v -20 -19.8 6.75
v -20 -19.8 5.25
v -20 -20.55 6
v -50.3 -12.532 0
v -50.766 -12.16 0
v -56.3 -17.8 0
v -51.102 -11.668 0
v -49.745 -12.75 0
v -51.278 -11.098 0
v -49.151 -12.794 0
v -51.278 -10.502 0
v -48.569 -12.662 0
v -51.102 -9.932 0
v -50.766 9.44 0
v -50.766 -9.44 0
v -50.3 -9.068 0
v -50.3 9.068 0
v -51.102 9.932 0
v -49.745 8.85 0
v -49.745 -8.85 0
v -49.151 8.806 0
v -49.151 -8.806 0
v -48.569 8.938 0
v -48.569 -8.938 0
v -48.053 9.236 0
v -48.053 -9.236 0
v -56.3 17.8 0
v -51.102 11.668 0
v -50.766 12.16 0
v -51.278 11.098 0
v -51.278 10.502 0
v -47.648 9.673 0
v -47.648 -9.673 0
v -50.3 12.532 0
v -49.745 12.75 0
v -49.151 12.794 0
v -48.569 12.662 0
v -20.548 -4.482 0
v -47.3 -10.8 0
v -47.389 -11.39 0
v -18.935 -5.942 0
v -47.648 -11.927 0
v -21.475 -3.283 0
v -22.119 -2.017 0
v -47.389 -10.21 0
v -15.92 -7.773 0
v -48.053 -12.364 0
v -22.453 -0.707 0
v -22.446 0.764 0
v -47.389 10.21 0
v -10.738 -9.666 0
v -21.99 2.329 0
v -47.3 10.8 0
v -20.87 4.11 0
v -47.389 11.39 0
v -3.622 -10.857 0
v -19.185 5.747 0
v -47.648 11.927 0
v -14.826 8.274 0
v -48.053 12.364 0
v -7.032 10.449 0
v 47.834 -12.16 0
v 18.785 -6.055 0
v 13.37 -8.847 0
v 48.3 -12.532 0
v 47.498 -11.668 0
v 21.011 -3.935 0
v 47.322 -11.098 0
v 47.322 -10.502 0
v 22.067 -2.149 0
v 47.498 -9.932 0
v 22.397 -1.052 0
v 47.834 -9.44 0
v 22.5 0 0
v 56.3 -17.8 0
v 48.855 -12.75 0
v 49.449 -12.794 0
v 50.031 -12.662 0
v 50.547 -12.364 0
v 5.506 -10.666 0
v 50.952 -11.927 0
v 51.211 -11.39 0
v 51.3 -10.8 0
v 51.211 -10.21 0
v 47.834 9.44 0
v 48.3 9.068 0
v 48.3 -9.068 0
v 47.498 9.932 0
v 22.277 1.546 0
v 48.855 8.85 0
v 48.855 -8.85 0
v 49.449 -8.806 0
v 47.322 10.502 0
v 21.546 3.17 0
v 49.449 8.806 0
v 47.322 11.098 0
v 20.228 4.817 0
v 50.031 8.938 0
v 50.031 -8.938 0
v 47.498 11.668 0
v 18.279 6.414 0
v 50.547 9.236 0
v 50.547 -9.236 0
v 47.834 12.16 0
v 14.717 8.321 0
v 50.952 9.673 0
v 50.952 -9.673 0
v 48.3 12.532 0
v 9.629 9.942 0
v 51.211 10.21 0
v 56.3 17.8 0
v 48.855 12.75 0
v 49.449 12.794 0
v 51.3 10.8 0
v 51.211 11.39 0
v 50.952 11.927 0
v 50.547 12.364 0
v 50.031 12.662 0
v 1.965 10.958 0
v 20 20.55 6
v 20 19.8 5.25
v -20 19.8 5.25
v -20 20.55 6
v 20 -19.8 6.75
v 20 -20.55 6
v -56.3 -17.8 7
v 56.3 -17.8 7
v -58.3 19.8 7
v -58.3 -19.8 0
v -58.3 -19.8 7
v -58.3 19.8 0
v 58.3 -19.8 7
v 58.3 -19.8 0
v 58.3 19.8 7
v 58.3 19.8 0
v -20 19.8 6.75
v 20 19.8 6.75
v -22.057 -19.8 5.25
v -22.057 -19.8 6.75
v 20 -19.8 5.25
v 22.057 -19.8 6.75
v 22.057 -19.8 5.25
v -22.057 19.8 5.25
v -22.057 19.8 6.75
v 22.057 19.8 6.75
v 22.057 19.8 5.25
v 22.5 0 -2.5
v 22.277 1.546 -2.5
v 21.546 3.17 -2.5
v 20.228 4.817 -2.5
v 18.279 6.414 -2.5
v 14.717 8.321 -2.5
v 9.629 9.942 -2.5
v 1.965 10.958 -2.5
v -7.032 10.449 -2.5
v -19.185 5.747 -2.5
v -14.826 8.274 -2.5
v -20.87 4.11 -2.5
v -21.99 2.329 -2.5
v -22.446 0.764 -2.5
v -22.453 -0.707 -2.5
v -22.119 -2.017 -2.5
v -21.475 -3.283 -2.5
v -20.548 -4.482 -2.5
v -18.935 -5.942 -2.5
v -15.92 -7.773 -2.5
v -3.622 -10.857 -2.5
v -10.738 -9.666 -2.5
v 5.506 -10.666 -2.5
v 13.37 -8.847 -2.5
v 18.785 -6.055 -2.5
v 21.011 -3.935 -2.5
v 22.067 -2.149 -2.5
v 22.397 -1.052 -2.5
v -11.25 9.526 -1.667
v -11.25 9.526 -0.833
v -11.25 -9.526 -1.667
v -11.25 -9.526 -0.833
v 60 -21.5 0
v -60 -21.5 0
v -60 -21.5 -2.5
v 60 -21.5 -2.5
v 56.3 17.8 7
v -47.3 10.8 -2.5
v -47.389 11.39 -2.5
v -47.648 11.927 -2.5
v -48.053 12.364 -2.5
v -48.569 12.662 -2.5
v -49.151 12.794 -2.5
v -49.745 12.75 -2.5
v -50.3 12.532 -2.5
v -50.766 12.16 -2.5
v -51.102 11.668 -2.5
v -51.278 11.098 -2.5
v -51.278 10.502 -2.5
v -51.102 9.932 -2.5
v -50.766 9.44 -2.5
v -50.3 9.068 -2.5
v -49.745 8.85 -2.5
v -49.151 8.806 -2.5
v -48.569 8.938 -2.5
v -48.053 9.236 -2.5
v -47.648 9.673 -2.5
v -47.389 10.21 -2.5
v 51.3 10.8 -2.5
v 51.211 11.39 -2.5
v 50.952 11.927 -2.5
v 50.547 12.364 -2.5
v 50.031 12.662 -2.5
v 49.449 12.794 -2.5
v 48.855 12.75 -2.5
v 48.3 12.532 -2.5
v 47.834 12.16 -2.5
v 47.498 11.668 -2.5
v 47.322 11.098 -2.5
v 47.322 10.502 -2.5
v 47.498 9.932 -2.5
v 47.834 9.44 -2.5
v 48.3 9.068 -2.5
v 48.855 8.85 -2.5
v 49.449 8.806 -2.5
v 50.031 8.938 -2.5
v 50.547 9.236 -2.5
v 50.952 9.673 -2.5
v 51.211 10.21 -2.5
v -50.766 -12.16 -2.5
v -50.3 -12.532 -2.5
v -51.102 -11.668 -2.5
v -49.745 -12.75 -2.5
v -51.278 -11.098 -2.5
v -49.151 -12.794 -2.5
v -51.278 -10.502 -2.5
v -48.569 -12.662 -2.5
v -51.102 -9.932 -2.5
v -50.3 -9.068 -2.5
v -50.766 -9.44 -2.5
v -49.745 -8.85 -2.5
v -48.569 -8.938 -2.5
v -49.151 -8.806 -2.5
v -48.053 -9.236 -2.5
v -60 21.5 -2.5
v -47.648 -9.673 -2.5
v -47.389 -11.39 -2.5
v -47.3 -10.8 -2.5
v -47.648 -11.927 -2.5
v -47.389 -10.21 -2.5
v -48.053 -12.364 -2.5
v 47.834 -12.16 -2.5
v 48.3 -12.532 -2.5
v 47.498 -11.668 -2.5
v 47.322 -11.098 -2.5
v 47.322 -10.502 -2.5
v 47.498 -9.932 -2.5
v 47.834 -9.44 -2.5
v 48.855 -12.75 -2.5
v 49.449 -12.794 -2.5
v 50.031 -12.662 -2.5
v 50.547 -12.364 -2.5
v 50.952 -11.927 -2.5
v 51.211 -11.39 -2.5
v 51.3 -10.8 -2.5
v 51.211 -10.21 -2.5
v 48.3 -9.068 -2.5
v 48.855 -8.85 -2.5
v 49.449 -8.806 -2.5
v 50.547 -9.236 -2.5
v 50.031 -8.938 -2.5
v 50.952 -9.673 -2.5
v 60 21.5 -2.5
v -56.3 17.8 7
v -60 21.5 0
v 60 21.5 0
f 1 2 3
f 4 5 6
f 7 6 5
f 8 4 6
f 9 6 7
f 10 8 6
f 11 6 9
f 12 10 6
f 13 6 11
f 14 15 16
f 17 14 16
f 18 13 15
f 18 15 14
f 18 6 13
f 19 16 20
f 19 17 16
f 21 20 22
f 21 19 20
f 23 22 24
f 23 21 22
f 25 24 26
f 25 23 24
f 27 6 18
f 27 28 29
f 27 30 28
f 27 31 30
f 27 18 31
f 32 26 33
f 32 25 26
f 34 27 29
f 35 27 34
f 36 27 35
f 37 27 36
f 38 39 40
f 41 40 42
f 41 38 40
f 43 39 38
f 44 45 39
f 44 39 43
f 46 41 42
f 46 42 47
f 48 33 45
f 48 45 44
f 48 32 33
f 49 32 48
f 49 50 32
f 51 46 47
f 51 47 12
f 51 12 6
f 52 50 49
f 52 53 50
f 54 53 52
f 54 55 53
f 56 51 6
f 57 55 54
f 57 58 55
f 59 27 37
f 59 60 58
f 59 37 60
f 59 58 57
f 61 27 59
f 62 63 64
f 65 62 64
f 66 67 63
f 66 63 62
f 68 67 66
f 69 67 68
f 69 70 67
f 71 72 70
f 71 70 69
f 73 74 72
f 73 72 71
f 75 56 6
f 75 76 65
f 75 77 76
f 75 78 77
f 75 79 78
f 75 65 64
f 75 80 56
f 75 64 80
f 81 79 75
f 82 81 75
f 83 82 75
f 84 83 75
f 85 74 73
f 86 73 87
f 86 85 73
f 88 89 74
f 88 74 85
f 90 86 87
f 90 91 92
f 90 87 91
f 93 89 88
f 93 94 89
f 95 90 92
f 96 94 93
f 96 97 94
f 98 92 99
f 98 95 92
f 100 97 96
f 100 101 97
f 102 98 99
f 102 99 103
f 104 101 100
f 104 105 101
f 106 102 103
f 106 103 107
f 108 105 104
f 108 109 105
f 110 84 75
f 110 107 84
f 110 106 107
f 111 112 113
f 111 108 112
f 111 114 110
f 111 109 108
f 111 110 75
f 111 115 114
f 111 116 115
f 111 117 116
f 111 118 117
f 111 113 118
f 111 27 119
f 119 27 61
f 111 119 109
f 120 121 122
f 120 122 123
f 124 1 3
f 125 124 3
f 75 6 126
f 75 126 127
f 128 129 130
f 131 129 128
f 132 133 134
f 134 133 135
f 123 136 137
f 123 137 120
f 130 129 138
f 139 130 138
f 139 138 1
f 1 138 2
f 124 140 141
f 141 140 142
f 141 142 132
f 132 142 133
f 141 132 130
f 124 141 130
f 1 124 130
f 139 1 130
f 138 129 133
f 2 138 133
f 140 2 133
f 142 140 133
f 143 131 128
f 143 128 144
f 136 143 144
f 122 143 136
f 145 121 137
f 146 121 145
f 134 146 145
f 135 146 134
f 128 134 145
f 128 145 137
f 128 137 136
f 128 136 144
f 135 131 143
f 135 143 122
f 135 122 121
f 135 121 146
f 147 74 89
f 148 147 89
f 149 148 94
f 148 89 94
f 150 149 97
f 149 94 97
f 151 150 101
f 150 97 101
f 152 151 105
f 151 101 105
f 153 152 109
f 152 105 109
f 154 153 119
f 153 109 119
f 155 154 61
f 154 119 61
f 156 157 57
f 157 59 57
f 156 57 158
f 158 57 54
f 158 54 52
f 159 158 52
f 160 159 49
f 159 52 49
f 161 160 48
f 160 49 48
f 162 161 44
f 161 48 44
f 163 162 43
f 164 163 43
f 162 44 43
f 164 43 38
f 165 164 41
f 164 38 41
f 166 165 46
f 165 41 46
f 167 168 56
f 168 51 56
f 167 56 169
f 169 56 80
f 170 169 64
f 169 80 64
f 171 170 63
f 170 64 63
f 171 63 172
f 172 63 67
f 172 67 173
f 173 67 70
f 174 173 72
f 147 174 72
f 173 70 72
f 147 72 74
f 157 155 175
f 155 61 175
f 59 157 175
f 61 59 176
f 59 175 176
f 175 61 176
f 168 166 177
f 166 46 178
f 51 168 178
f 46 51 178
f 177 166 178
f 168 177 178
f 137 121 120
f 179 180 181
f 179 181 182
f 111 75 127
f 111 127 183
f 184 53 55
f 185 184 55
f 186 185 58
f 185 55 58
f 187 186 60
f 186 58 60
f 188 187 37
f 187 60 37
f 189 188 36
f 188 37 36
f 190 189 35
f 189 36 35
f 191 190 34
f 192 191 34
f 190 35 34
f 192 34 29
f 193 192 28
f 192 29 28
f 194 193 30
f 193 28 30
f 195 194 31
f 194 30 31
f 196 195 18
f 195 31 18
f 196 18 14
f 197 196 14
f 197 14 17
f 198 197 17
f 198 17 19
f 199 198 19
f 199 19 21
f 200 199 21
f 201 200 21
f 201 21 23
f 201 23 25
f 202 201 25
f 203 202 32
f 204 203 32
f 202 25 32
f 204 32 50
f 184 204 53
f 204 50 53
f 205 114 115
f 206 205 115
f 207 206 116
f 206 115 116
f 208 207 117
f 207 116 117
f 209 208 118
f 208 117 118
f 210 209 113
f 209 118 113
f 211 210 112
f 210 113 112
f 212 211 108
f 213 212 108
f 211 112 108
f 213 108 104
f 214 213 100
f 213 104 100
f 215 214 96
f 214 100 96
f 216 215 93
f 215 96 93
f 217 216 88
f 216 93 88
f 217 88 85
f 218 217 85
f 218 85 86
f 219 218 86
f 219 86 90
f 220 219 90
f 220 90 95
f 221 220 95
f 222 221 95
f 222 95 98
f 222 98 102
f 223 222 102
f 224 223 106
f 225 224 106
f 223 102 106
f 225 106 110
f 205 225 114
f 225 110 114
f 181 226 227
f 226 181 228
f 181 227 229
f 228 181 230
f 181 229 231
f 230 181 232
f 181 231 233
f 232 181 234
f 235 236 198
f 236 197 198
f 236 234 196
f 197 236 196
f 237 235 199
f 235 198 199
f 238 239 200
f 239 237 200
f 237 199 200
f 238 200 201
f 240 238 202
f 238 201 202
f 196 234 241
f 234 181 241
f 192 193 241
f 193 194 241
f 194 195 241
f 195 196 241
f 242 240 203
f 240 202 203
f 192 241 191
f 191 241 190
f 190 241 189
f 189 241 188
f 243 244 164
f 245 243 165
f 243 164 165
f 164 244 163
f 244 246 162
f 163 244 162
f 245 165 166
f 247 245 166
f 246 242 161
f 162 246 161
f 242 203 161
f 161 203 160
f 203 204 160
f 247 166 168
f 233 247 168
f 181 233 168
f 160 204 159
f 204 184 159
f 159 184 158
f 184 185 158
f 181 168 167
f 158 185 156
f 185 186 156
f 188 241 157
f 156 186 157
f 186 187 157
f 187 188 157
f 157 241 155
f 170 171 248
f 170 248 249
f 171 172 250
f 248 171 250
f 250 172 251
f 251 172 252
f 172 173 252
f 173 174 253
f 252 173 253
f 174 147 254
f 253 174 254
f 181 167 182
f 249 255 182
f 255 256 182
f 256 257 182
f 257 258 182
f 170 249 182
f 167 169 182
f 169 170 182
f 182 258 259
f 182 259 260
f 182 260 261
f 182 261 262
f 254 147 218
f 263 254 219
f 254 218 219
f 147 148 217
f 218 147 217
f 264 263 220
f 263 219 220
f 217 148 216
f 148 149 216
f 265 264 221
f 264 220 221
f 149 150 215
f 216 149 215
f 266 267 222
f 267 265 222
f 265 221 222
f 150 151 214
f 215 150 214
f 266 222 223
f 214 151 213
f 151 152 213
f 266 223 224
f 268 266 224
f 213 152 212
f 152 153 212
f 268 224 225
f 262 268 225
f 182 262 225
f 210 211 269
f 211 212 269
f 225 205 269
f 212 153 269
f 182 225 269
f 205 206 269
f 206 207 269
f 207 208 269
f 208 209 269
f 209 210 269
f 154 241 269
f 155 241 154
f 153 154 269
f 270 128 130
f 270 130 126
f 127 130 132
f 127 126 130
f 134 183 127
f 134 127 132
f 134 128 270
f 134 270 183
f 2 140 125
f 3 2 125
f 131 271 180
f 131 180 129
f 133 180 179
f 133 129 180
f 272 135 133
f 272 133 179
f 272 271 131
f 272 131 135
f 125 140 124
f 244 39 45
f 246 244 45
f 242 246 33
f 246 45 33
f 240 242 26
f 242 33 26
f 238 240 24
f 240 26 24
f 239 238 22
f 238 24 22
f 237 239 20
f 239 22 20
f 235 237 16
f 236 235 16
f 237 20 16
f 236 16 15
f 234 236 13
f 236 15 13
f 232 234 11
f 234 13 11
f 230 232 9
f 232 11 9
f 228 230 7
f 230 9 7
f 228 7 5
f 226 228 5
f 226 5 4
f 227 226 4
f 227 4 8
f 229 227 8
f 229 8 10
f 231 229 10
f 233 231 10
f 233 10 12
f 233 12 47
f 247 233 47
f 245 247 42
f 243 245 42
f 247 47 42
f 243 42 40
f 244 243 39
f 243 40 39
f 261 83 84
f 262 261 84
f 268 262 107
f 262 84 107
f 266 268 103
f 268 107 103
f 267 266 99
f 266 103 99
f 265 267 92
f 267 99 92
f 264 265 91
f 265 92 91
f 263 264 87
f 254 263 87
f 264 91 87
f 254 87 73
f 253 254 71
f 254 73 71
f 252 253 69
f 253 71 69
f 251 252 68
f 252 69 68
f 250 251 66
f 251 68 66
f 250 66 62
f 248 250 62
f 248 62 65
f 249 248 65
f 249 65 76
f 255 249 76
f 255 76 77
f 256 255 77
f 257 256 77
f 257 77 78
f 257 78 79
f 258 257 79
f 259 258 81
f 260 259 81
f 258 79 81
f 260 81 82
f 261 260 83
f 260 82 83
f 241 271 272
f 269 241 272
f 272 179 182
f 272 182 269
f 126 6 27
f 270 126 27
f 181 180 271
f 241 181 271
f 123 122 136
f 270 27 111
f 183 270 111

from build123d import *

# Parameters (mm, degrees)
F0_W        = 120
F0_H        = 43
F0_W_2      = 116.6
F0_H_2      = 39.6
F0_W_3      = 112.6
F0_H_3      = 35.6
F0_R        = 2
F1_DEPTH    = 2.5
F2_DEPTH    = 7
F3_W        = 40
F3_H        = 1.5
F4_DEPTH    = 0.8
F5_T4_DEPTH = 44.1146927807
F5_T9_DEPTH = 44.1146927807


# Not quite as in the source:
# - a fillet or chamfer that OpenCascade refuses, or shapes differently, is made with other operations: its cross-section is extruded or revolved along the edge and cut away or added


with BuildPart() as f1:
    # F0 (on Top) → F1 (new body)
    with BuildSketch(Plane.XY):
        Rectangle(F0_W, F0_H)
        Rectangle(F0_W_2, F0_H_2, mode=Mode.SUBTRACT)
        Rectangle(F0_W_2, F0_H_2)
        Rectangle(F0_W_3, F0_H_3, mode=Mode.SUBTRACT)
        Rectangle(F0_W_3, F0_H_3)
        with Locations((-49.3, -10.8)):
            Circle(F0_R, mode=Mode.SUBTRACT)
        with Locations((49.3, -10.8)):
            Circle(F0_R, mode=Mode.SUBTRACT)
        with Locations((-49.3, 10.8)):
            Circle(F0_R, mode=Mode.SUBTRACT)
        with BuildLine():
            add(Edge.make_bspline(
                [(22.5, 0), (22.5, 19.0525588833), (-11.25, 9.5262794416), (-45, 0), (-11.25, -9.5262794416), (22.5, -19.0525588833), (22.5, 0)],
                knots=[0, 0, 0, 2.0943951024, 2.0943951024, 4.1887902048, 4.1887902048, 6.2831853072, 6.2831853072, 6.2831853072], degree=2, weights=[1, 0.5, 1, 0.5, 1, 0.5, 1]))
        make_face(mode=Mode.SUBTRACT)
        with Locations((49.3, 10.8)):
            Circle(F0_R, mode=Mode.SUBTRACT)
    extrude(amount=-F1_DEPTH)

    # F0 (on Top) → F2 (join)
    with BuildSketch(Plane.XY):
        Rectangle(F0_W_2, F0_H_2)
        Rectangle(F0_W_3, F0_H_3, mode=Mode.SUBTRACT)
    extrude(amount=F2_DEPTH)

    # F3 (on face) → F4 (join)
    with BuildSketch(Plane(origin=(0, 19.8, 0), x_dir=(-1, 0, 0), z_dir=(0, 1, 0))):
        with Locations((0, 6)):
            Rectangle(F3_W, F3_H)
    extrude(amount=F4_DEPTH)

    # F5: chamfer of 0.8 on 2 edges, made by hand


with BuildPart() as f5_tool2:
    # F5_s3 → F5_t4 (new body)
    with BuildSketch(Plane.YZ.offset(22.0573463904)):
        Polygon((19.8, 5.25), (20.6, 6.05), (20.6, 5.25), align=None)
    extrude(amount=-F5_T4_DEPTH)

    split(bisect_by=Plane.XZ.offset(-19.8), keep=Keep.BOTTOM)


with BuildPart() as f1_1:
    add(f1.part)

    # F5_t1: cut F5_tool2
    add(f5_tool2.part, mode=Mode.SUBTRACT)


with BuildPart() as f5_tool7:
    # F5_s8 → F5_t9 (new body)
    with BuildSketch(Plane.YZ.offset(-22.0573463904)):
        Polygon((19.8, 6.75), (20.6, 5.95), (20.6, 6.75), align=None)
    extrude(amount=F5_T9_DEPTH)

    split(bisect_by=Plane.XZ.offset(-19.8), keep=Keep.BOTTOM)


with BuildPart() as f1_2:
    add(f1_1.part)

    # F5_t6: cut F5_tool7
    add(f5_tool7.part, mode=Mode.SUBTRACT)

    # F6: F1 across plane


with BuildPart() as f1_3:
    add(f1_2.part)
    add(f1_2.part.mirror(Plane.XZ))


solid = f1_3.part
